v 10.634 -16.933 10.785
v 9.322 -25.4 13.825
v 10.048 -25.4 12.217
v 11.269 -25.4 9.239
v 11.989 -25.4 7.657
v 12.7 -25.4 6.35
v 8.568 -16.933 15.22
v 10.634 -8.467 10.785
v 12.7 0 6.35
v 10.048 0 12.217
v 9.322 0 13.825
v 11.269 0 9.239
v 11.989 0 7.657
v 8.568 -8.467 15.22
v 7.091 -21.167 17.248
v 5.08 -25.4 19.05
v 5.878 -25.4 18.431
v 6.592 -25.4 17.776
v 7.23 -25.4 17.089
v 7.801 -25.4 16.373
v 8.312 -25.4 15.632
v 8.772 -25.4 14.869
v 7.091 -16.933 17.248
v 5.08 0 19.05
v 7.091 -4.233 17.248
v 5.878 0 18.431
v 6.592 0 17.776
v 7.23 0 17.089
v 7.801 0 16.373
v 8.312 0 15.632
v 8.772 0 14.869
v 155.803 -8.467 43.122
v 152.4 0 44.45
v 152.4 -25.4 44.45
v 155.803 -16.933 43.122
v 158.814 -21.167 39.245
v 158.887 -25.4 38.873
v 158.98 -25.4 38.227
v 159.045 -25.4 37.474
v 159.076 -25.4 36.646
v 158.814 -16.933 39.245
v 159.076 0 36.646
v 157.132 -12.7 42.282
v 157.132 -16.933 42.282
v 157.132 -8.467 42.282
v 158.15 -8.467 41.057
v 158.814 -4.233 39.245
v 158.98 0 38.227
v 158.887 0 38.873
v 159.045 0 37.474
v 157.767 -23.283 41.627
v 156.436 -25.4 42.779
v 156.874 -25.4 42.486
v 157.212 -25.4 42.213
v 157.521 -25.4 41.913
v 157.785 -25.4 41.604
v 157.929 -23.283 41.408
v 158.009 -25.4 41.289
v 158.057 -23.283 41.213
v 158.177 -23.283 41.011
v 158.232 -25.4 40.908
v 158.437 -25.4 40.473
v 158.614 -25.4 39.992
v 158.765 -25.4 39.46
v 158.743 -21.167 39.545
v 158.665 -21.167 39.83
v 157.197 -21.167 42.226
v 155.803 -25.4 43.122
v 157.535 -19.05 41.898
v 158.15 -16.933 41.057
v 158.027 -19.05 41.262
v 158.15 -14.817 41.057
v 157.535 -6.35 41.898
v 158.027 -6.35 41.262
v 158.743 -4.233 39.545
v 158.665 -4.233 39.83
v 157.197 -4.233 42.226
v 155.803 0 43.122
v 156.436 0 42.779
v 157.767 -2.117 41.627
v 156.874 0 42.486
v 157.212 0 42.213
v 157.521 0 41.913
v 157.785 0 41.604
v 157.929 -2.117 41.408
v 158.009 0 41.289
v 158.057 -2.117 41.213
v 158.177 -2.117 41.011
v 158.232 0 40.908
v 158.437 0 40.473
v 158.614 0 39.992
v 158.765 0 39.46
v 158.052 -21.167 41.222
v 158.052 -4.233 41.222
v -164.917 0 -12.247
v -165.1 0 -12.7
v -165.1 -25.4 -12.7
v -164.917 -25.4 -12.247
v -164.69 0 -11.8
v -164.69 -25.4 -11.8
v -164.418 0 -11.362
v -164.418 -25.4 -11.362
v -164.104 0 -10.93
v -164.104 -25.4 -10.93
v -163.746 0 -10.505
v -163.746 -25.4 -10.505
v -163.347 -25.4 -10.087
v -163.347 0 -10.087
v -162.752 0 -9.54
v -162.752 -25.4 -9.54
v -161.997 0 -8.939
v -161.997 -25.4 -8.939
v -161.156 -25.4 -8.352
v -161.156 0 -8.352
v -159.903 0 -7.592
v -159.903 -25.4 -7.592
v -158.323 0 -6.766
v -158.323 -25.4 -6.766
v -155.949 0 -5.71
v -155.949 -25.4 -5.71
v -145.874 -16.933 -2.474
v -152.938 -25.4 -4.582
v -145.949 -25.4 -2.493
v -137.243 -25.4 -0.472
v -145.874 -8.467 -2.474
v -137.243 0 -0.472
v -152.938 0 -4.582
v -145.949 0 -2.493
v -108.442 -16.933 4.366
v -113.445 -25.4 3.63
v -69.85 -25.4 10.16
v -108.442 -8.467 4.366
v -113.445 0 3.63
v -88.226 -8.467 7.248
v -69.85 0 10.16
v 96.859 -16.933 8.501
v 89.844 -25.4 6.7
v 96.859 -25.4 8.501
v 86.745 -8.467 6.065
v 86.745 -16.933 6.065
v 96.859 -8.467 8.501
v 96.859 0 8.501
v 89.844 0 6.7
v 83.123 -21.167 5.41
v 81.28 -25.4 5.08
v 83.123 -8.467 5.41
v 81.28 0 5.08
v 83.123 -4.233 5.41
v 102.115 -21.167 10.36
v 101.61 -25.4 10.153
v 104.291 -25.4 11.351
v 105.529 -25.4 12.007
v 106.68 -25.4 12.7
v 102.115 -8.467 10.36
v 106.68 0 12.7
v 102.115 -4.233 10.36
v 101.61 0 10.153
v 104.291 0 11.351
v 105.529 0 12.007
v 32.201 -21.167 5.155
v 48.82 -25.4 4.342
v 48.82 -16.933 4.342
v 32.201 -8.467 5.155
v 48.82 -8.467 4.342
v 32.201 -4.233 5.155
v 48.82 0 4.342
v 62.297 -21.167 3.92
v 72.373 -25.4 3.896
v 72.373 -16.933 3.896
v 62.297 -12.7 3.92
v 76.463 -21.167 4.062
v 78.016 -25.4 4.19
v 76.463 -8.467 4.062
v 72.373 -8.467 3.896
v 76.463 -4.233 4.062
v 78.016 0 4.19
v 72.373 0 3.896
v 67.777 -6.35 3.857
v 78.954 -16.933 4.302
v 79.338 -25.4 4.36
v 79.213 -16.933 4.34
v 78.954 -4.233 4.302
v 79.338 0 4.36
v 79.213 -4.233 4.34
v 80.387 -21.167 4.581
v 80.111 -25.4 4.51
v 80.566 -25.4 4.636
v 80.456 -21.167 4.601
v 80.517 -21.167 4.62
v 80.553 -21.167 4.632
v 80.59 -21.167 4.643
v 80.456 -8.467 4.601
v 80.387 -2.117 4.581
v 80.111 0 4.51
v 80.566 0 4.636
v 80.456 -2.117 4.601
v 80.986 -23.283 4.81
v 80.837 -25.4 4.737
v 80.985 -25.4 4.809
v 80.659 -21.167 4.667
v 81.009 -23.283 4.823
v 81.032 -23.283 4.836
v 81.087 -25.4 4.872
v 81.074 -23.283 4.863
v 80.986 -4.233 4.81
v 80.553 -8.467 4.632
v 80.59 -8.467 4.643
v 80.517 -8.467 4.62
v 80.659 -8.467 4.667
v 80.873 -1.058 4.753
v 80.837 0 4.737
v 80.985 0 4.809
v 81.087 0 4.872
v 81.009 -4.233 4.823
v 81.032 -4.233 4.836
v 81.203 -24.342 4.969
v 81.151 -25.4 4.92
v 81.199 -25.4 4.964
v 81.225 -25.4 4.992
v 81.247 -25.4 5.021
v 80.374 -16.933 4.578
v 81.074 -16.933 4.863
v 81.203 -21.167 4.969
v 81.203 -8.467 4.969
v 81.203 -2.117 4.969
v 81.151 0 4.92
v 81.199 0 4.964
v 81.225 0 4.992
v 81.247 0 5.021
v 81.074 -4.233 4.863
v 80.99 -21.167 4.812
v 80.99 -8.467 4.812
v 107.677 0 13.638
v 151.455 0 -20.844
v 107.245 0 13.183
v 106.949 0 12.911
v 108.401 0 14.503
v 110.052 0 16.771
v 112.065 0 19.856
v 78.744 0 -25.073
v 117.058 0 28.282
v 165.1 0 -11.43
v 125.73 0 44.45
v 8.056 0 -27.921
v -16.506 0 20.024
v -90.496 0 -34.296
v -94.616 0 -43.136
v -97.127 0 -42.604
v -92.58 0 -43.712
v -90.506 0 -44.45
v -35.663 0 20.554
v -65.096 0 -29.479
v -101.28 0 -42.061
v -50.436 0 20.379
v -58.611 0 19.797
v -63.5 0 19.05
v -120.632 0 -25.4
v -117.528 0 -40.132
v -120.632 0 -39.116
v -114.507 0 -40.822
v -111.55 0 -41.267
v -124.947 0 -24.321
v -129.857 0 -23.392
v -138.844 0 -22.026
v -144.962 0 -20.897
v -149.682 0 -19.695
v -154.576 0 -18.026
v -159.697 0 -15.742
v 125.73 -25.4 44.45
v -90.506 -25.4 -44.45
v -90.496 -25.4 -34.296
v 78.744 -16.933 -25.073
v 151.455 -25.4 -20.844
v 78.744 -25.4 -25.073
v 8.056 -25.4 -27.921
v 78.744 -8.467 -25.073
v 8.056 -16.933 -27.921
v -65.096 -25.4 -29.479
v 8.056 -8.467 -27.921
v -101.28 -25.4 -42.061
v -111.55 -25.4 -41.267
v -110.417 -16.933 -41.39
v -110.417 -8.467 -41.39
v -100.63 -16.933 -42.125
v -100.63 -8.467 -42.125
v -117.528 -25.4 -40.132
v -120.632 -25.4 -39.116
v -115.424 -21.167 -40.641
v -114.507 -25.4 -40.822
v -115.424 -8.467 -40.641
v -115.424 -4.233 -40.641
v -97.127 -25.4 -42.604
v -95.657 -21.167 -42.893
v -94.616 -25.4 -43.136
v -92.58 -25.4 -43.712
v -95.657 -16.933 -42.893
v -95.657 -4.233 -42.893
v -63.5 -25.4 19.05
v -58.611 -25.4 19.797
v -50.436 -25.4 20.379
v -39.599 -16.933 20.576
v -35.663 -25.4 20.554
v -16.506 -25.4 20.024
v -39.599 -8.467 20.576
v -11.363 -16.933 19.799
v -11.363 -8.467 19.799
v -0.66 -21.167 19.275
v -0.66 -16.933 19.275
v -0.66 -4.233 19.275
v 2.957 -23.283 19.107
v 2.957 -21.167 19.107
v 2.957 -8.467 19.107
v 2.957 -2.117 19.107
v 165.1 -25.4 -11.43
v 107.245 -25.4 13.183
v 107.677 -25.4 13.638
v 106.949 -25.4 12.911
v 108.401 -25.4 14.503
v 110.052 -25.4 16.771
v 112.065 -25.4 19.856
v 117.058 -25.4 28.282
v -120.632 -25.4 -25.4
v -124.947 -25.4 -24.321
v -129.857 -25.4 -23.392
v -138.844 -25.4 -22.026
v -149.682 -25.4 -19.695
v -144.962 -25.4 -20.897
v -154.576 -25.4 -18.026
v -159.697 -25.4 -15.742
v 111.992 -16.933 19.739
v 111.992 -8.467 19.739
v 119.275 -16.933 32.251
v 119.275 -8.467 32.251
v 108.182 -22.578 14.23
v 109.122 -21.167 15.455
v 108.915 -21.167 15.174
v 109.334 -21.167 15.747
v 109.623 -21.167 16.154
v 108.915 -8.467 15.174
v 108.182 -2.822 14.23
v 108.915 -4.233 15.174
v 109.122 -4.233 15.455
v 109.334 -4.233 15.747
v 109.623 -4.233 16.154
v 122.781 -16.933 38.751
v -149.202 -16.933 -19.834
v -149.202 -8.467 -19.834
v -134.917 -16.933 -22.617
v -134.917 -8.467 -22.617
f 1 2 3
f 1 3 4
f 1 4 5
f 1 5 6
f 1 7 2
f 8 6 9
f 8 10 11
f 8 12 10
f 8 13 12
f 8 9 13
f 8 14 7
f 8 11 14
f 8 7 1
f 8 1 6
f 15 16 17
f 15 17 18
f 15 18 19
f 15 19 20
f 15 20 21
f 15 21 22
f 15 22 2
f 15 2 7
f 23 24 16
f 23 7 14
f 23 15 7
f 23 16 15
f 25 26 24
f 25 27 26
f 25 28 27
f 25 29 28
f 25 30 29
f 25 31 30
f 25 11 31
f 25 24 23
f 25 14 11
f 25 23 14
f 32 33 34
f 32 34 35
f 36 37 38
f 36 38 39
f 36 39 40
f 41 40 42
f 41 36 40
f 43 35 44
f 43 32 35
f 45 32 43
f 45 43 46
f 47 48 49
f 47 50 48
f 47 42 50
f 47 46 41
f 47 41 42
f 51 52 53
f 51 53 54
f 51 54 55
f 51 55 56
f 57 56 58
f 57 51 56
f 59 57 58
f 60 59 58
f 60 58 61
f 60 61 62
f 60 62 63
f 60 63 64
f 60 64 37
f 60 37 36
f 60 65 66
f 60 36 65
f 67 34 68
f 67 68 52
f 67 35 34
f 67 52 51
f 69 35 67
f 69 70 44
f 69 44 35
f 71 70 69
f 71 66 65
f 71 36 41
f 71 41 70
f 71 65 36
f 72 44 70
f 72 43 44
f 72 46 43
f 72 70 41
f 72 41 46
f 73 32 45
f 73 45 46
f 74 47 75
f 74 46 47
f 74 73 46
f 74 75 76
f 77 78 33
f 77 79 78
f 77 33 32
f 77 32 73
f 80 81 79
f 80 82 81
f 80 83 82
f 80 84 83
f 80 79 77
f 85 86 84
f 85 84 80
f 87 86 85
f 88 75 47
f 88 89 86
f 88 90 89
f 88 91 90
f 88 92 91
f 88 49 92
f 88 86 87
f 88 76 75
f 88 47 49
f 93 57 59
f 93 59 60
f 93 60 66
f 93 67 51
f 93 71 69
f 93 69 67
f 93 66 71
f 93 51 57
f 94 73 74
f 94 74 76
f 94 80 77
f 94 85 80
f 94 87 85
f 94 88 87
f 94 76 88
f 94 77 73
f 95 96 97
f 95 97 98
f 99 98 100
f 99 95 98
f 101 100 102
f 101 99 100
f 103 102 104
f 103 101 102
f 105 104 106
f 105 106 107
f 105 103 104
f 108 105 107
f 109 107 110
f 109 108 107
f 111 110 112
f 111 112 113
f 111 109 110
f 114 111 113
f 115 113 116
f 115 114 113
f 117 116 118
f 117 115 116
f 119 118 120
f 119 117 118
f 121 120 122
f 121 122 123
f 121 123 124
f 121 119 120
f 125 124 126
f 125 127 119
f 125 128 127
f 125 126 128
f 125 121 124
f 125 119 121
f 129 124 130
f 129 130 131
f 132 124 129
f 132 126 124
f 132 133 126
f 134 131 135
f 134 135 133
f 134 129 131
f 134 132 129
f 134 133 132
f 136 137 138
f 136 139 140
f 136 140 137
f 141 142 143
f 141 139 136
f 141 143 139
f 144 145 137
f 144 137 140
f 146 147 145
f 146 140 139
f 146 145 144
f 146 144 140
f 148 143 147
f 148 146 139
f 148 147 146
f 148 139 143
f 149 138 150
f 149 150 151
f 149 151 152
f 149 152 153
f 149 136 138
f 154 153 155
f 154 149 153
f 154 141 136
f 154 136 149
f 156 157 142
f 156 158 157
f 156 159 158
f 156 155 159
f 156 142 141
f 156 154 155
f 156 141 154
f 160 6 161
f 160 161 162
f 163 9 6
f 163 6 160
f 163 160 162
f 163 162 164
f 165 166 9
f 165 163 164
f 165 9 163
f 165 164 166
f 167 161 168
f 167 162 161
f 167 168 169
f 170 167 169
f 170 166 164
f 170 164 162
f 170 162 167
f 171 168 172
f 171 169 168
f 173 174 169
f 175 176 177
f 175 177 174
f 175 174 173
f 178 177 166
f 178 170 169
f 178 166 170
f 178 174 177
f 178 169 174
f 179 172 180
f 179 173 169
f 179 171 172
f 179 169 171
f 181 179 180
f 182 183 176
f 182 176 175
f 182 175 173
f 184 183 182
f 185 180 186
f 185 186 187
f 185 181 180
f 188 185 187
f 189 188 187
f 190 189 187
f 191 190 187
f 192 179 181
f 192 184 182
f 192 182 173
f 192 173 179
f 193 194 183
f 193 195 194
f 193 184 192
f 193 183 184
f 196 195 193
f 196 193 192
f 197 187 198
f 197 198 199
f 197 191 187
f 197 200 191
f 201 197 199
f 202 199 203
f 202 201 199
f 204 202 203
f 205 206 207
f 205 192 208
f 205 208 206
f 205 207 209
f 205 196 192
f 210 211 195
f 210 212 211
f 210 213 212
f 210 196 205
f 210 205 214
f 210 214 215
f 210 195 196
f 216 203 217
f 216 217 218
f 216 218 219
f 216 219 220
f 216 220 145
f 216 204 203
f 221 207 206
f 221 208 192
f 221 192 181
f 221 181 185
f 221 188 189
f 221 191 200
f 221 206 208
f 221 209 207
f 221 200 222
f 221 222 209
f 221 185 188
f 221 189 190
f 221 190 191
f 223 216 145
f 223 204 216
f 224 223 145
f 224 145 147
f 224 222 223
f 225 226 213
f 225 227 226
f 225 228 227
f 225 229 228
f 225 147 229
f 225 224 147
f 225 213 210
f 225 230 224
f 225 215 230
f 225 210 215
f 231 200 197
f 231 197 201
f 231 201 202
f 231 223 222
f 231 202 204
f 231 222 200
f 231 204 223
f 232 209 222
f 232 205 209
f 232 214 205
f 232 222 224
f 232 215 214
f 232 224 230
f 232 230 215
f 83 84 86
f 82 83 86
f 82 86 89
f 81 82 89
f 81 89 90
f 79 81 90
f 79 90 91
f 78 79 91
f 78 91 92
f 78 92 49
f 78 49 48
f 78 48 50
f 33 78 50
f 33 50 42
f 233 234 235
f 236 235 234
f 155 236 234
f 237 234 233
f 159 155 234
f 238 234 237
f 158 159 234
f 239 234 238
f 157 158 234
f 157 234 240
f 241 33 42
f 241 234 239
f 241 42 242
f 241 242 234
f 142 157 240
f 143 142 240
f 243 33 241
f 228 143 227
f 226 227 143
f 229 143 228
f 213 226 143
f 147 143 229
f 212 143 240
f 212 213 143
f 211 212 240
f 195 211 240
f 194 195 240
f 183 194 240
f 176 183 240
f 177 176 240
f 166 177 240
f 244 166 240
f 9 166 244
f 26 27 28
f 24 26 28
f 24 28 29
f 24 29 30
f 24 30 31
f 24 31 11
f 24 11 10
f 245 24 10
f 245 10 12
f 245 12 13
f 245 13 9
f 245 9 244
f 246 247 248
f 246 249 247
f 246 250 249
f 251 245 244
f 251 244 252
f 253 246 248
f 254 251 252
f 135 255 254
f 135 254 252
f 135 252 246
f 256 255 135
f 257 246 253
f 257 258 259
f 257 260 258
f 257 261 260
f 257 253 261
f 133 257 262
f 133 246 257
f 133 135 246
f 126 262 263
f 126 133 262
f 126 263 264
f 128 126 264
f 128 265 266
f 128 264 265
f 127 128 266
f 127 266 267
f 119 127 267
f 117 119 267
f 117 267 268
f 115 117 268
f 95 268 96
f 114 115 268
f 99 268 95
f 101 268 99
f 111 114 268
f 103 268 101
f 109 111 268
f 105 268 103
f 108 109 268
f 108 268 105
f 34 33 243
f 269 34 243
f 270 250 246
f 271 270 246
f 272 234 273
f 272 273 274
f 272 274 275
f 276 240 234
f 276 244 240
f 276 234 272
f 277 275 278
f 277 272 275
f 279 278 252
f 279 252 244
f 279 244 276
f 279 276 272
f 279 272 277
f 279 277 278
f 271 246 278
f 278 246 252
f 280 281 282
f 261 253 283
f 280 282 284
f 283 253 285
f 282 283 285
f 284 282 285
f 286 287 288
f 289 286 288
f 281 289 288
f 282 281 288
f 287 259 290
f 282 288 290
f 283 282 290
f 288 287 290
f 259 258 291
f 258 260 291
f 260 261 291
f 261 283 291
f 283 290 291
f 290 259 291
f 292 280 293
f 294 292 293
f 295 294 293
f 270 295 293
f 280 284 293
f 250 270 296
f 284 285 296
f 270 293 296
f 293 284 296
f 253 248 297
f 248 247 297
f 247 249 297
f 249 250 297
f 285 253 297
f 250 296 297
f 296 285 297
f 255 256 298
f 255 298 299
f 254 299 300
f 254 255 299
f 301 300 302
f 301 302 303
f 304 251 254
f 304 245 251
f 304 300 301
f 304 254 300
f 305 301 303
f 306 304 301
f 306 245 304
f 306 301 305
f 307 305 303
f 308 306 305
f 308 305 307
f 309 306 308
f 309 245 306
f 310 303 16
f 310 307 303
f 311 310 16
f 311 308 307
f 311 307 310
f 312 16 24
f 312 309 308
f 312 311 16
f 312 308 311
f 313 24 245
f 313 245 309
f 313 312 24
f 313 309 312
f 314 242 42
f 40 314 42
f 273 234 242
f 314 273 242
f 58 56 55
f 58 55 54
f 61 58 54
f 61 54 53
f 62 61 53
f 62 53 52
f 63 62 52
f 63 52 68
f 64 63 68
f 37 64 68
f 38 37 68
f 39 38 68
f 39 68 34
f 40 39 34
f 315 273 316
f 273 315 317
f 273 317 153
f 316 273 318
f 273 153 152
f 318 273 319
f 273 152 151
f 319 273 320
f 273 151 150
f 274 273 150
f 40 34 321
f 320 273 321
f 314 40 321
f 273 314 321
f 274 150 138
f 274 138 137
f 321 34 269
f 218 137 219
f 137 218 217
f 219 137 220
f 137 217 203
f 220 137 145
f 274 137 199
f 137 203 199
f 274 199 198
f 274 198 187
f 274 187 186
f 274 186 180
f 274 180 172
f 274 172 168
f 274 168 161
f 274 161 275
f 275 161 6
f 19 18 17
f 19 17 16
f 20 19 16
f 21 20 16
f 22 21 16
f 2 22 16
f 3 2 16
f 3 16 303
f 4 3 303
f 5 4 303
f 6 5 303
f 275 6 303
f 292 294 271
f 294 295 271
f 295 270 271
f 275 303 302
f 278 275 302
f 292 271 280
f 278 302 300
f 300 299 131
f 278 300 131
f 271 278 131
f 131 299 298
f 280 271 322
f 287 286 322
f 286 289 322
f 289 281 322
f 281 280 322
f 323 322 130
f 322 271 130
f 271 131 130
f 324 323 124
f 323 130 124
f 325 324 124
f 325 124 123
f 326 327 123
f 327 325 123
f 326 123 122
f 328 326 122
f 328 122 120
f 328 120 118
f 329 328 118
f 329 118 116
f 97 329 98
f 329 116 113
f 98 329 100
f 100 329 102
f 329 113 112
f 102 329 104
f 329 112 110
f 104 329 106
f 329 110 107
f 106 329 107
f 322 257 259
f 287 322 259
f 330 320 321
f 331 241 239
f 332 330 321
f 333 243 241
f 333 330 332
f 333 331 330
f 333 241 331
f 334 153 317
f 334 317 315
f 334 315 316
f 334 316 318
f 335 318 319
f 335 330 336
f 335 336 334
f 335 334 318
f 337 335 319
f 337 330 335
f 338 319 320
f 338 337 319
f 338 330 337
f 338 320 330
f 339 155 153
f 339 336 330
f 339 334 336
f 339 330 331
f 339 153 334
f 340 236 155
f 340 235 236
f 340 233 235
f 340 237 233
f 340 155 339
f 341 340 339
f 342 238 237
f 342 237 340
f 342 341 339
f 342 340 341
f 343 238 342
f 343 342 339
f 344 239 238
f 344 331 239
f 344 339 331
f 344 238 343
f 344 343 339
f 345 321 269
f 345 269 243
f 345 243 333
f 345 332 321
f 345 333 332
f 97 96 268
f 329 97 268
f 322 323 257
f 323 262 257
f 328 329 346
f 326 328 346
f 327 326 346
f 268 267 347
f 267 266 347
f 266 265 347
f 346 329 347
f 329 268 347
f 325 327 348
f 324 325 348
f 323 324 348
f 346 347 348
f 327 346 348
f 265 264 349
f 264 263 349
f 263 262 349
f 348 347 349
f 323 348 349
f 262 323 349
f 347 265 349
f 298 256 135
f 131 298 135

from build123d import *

# Parameters (mm, degrees)
F1_DEPTH = 25.4


with BuildPart() as f1:
    # F0 (on Front) → F1 (new body)
    with BuildSketch(Plane.XZ):
        with BuildLine():
            add(Edge.make_bspline(
                [(-165.1, -12.7), (-160.657838, 0), (-103.340782, 4.108928), (-69.85, 10.16)],
                knots=[0, 0, 0, 0, 97.954796, 97.954796, 97.954796, 97.954796], degree=3))
            add(Edge.make_bspline(
                [(-165.1, -12.7), (-147.857636, -23.46072), (-135.454967, -21.166667), (-120.63245, -25.4)],
                knots=[0, 0, 0, 0, 46.245572, 46.245572, 46.245572, 46.245572], degree=3))
            Line((-120.63245, -25.4), (-120.63245, -39.115937))
            add(Edge.make_bspline(
                [(-120.63245, -39.115937), (-109.949814, -43.202554), (-101.051494, -40.286522), (-90.506003, -44.45)],
                knots=[0, 0, 0, 0, 30.595017, 30.595017, 30.595017, 30.595017], degree=3))
            Line((-90.506003, -44.45), (-90.49646, -34.296204))
            Line((-90.49646, -34.296204), (-65.09646, -29.478624))
            add(Edge.make_bspline(
                [(151.454941, -20.844295), (76.237051, -25.794228), (10.784542, -28.536206), (-65.09646, -29.478624)],
                knots=[0, 0, 0, 0, 216.723466, 216.723466, 216.723466, 216.723466], degree=3))
            Line((151.454941, -20.844295), (165.1, -11.43))
            Line((165.1, -11.43), (159.076229, 36.646433))
            add(Edge.make_bspline(
                [(152.4, 44.45), (156.209528, 42.954981), (158.982977, 42.765886), (159.076229, 36.646433)],
                knots=[0, 0, 0, 0, 10.269746, 10.269746, 10.269746, 10.269746], degree=3))
            Line((152.4, 44.45), (125.73, 44.45))
            add(Edge.make_bspline(
                [(106.68, 12.7), (110.074804, 15.075844), (120.621224, 34.334068), (125.73, 44.45)],
                knots=[0, 0, 0, 0, 37.026545, 37.026545, 37.026545, 37.026545], degree=3))
            add(Edge.make_bspline(
                [(81.28, 5.08), (82.77345, 5.442668), (98.651765, 7.514939), (106.68, 12.7)],
                knots=[0, 0, 0, 0, 26.518379, 26.518379, 26.518379, 26.518379], degree=3))
            add(Edge.make_bspline(
                [(12.7, 6.35), (54.409864, 3.585023), (80.389956, 3.057459), (81.28, 5.08)],
                knots=[0, 0, 0, 0, 68.591758, 68.591758, 68.591758, 68.591758], degree=3))
            add(Edge.make_bspline(
                [(5.08, 19.05), (9.753358, 15.723685), (10.16, 10.583333), (12.7, 6.35)],
                knots=[0, 0, 0, 0, 14.810618, 14.810618, 14.810618, 14.810618], degree=3))
            add(Edge.make_bspline(
                [(-63.5, 19.05), (-47.14213, 22.504569), (-0.091556, 19.008015), (5.08, 19.05)],
                knots=[0, 0, 0, 0, 68.58, 68.58, 68.58, 68.58], degree=3))
            Line((-63.5, 19.05), (-69.85, 10.16))
        make_face()
    extrude(amount=F1_DEPTH)


solid = f1.part
